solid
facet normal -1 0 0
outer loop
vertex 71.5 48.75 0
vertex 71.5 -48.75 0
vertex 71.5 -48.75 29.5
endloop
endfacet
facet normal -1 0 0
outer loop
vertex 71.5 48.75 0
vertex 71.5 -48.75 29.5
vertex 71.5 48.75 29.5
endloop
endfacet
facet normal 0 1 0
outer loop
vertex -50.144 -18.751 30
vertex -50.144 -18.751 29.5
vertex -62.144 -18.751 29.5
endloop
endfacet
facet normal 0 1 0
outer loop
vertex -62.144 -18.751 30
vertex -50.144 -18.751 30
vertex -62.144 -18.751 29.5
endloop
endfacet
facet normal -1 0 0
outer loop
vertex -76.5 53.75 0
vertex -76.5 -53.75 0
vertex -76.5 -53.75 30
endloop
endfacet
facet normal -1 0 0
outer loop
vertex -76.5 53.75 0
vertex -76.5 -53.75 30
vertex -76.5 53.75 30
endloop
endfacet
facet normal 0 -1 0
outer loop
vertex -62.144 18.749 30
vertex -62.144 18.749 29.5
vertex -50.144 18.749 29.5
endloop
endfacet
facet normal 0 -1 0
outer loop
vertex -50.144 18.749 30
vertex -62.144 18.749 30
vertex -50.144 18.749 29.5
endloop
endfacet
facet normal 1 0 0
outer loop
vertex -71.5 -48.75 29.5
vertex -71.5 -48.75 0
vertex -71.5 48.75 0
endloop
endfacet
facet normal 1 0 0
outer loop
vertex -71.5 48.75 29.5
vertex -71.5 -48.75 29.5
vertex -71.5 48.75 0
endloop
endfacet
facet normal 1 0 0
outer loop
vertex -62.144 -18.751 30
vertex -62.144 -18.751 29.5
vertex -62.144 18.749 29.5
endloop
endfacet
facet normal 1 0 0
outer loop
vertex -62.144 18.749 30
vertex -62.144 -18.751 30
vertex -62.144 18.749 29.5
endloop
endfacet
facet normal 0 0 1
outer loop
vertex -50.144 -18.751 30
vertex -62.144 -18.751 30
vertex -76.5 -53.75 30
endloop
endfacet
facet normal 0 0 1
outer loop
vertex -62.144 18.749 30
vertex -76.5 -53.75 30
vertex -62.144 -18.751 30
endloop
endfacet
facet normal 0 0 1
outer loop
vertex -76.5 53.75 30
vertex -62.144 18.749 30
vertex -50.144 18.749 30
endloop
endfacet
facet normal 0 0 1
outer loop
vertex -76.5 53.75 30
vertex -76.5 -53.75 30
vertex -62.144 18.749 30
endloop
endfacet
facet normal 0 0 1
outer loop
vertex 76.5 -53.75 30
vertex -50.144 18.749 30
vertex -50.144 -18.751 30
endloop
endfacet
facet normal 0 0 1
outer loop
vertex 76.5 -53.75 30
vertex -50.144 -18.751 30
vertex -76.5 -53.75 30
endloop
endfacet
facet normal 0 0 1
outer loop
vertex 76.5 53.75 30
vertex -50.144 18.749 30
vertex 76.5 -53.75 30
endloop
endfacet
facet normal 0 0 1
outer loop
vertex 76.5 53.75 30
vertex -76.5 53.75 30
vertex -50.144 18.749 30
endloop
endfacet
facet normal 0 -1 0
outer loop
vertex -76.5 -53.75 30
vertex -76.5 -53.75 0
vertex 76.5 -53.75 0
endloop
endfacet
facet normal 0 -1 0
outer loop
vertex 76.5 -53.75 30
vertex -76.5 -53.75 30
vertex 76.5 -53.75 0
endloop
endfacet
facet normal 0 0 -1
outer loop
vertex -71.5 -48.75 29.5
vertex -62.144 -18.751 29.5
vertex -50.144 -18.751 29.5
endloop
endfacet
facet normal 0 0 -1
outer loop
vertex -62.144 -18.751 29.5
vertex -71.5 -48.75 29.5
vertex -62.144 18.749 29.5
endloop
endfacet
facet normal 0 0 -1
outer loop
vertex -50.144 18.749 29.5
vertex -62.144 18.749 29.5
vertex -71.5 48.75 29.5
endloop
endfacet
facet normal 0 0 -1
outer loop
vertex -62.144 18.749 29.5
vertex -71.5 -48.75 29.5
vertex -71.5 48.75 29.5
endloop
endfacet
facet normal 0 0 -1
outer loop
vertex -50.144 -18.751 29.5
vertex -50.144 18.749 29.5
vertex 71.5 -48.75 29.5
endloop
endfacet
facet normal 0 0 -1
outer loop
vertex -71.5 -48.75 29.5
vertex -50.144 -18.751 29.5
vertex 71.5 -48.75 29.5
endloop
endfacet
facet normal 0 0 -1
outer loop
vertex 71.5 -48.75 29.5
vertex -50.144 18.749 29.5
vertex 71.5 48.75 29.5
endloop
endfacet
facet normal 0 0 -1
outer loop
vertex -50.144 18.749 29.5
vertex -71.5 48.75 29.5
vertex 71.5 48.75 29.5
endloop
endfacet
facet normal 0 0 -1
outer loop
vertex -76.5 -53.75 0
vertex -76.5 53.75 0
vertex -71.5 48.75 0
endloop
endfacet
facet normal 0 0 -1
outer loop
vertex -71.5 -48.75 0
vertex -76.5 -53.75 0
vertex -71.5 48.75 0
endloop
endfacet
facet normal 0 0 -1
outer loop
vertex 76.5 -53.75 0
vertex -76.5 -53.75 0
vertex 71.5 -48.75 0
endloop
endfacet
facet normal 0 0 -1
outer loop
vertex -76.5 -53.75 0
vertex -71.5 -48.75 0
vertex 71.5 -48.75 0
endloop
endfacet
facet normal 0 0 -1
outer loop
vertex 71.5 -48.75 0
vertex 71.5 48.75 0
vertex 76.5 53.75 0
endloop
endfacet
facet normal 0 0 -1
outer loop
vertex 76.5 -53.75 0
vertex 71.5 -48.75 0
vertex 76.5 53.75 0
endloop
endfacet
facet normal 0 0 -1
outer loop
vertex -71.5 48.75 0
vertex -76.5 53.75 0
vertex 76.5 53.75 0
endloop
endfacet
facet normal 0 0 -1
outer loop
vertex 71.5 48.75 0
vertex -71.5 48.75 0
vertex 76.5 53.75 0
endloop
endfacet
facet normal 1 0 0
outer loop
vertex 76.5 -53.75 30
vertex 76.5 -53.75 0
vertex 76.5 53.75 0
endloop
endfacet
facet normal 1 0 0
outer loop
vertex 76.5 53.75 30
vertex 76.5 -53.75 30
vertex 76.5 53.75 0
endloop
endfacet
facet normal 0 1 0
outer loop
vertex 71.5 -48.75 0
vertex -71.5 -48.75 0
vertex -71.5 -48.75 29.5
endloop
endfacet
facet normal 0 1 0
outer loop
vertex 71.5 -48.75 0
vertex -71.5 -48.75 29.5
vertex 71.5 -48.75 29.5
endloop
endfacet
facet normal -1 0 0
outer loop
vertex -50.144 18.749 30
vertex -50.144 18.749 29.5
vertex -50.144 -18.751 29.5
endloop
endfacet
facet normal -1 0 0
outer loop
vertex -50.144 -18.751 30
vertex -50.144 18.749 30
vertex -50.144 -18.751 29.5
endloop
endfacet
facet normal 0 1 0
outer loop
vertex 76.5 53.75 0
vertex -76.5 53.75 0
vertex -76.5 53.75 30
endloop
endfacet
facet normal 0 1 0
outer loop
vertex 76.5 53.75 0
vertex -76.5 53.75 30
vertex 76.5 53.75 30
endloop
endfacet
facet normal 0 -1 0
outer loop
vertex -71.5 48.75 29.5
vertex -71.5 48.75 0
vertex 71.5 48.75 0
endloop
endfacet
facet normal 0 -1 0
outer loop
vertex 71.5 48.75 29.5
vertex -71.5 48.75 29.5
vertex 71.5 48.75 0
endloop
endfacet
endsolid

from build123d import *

# Parameters (mm, degrees)
F0_W     = 153
F0_H     = 107.5
F1_DEPTH = 30
F2_W     = 143
F2_H     = 97.5
F3_DEPTH = 29.5


with BuildPart() as f1:
    # F0 (on Top) → F1 (new body)
    with BuildSketch(Plane.XY):
        Rectangle(F0_W, F0_H)
        Polygon((-62.144428, -18.7512), (-62.144428, 18.7488), (-50.144428, 18.7488), (-50.144428, 6.394679), (-50.144428, 0.0036), (-50.144428, -18.7512), align=None, mode=Mode.SUBTRACT)
    extrude(amount=F1_DEPTH)

    # F2 (on Top) → F3 (cut)
    with BuildSketch(Plane.XY):
        Rectangle(F2_W, F2_H)
    extrude(amount=F3_DEPTH, mode=Mode.SUBTRACT)


solid = f1.part
